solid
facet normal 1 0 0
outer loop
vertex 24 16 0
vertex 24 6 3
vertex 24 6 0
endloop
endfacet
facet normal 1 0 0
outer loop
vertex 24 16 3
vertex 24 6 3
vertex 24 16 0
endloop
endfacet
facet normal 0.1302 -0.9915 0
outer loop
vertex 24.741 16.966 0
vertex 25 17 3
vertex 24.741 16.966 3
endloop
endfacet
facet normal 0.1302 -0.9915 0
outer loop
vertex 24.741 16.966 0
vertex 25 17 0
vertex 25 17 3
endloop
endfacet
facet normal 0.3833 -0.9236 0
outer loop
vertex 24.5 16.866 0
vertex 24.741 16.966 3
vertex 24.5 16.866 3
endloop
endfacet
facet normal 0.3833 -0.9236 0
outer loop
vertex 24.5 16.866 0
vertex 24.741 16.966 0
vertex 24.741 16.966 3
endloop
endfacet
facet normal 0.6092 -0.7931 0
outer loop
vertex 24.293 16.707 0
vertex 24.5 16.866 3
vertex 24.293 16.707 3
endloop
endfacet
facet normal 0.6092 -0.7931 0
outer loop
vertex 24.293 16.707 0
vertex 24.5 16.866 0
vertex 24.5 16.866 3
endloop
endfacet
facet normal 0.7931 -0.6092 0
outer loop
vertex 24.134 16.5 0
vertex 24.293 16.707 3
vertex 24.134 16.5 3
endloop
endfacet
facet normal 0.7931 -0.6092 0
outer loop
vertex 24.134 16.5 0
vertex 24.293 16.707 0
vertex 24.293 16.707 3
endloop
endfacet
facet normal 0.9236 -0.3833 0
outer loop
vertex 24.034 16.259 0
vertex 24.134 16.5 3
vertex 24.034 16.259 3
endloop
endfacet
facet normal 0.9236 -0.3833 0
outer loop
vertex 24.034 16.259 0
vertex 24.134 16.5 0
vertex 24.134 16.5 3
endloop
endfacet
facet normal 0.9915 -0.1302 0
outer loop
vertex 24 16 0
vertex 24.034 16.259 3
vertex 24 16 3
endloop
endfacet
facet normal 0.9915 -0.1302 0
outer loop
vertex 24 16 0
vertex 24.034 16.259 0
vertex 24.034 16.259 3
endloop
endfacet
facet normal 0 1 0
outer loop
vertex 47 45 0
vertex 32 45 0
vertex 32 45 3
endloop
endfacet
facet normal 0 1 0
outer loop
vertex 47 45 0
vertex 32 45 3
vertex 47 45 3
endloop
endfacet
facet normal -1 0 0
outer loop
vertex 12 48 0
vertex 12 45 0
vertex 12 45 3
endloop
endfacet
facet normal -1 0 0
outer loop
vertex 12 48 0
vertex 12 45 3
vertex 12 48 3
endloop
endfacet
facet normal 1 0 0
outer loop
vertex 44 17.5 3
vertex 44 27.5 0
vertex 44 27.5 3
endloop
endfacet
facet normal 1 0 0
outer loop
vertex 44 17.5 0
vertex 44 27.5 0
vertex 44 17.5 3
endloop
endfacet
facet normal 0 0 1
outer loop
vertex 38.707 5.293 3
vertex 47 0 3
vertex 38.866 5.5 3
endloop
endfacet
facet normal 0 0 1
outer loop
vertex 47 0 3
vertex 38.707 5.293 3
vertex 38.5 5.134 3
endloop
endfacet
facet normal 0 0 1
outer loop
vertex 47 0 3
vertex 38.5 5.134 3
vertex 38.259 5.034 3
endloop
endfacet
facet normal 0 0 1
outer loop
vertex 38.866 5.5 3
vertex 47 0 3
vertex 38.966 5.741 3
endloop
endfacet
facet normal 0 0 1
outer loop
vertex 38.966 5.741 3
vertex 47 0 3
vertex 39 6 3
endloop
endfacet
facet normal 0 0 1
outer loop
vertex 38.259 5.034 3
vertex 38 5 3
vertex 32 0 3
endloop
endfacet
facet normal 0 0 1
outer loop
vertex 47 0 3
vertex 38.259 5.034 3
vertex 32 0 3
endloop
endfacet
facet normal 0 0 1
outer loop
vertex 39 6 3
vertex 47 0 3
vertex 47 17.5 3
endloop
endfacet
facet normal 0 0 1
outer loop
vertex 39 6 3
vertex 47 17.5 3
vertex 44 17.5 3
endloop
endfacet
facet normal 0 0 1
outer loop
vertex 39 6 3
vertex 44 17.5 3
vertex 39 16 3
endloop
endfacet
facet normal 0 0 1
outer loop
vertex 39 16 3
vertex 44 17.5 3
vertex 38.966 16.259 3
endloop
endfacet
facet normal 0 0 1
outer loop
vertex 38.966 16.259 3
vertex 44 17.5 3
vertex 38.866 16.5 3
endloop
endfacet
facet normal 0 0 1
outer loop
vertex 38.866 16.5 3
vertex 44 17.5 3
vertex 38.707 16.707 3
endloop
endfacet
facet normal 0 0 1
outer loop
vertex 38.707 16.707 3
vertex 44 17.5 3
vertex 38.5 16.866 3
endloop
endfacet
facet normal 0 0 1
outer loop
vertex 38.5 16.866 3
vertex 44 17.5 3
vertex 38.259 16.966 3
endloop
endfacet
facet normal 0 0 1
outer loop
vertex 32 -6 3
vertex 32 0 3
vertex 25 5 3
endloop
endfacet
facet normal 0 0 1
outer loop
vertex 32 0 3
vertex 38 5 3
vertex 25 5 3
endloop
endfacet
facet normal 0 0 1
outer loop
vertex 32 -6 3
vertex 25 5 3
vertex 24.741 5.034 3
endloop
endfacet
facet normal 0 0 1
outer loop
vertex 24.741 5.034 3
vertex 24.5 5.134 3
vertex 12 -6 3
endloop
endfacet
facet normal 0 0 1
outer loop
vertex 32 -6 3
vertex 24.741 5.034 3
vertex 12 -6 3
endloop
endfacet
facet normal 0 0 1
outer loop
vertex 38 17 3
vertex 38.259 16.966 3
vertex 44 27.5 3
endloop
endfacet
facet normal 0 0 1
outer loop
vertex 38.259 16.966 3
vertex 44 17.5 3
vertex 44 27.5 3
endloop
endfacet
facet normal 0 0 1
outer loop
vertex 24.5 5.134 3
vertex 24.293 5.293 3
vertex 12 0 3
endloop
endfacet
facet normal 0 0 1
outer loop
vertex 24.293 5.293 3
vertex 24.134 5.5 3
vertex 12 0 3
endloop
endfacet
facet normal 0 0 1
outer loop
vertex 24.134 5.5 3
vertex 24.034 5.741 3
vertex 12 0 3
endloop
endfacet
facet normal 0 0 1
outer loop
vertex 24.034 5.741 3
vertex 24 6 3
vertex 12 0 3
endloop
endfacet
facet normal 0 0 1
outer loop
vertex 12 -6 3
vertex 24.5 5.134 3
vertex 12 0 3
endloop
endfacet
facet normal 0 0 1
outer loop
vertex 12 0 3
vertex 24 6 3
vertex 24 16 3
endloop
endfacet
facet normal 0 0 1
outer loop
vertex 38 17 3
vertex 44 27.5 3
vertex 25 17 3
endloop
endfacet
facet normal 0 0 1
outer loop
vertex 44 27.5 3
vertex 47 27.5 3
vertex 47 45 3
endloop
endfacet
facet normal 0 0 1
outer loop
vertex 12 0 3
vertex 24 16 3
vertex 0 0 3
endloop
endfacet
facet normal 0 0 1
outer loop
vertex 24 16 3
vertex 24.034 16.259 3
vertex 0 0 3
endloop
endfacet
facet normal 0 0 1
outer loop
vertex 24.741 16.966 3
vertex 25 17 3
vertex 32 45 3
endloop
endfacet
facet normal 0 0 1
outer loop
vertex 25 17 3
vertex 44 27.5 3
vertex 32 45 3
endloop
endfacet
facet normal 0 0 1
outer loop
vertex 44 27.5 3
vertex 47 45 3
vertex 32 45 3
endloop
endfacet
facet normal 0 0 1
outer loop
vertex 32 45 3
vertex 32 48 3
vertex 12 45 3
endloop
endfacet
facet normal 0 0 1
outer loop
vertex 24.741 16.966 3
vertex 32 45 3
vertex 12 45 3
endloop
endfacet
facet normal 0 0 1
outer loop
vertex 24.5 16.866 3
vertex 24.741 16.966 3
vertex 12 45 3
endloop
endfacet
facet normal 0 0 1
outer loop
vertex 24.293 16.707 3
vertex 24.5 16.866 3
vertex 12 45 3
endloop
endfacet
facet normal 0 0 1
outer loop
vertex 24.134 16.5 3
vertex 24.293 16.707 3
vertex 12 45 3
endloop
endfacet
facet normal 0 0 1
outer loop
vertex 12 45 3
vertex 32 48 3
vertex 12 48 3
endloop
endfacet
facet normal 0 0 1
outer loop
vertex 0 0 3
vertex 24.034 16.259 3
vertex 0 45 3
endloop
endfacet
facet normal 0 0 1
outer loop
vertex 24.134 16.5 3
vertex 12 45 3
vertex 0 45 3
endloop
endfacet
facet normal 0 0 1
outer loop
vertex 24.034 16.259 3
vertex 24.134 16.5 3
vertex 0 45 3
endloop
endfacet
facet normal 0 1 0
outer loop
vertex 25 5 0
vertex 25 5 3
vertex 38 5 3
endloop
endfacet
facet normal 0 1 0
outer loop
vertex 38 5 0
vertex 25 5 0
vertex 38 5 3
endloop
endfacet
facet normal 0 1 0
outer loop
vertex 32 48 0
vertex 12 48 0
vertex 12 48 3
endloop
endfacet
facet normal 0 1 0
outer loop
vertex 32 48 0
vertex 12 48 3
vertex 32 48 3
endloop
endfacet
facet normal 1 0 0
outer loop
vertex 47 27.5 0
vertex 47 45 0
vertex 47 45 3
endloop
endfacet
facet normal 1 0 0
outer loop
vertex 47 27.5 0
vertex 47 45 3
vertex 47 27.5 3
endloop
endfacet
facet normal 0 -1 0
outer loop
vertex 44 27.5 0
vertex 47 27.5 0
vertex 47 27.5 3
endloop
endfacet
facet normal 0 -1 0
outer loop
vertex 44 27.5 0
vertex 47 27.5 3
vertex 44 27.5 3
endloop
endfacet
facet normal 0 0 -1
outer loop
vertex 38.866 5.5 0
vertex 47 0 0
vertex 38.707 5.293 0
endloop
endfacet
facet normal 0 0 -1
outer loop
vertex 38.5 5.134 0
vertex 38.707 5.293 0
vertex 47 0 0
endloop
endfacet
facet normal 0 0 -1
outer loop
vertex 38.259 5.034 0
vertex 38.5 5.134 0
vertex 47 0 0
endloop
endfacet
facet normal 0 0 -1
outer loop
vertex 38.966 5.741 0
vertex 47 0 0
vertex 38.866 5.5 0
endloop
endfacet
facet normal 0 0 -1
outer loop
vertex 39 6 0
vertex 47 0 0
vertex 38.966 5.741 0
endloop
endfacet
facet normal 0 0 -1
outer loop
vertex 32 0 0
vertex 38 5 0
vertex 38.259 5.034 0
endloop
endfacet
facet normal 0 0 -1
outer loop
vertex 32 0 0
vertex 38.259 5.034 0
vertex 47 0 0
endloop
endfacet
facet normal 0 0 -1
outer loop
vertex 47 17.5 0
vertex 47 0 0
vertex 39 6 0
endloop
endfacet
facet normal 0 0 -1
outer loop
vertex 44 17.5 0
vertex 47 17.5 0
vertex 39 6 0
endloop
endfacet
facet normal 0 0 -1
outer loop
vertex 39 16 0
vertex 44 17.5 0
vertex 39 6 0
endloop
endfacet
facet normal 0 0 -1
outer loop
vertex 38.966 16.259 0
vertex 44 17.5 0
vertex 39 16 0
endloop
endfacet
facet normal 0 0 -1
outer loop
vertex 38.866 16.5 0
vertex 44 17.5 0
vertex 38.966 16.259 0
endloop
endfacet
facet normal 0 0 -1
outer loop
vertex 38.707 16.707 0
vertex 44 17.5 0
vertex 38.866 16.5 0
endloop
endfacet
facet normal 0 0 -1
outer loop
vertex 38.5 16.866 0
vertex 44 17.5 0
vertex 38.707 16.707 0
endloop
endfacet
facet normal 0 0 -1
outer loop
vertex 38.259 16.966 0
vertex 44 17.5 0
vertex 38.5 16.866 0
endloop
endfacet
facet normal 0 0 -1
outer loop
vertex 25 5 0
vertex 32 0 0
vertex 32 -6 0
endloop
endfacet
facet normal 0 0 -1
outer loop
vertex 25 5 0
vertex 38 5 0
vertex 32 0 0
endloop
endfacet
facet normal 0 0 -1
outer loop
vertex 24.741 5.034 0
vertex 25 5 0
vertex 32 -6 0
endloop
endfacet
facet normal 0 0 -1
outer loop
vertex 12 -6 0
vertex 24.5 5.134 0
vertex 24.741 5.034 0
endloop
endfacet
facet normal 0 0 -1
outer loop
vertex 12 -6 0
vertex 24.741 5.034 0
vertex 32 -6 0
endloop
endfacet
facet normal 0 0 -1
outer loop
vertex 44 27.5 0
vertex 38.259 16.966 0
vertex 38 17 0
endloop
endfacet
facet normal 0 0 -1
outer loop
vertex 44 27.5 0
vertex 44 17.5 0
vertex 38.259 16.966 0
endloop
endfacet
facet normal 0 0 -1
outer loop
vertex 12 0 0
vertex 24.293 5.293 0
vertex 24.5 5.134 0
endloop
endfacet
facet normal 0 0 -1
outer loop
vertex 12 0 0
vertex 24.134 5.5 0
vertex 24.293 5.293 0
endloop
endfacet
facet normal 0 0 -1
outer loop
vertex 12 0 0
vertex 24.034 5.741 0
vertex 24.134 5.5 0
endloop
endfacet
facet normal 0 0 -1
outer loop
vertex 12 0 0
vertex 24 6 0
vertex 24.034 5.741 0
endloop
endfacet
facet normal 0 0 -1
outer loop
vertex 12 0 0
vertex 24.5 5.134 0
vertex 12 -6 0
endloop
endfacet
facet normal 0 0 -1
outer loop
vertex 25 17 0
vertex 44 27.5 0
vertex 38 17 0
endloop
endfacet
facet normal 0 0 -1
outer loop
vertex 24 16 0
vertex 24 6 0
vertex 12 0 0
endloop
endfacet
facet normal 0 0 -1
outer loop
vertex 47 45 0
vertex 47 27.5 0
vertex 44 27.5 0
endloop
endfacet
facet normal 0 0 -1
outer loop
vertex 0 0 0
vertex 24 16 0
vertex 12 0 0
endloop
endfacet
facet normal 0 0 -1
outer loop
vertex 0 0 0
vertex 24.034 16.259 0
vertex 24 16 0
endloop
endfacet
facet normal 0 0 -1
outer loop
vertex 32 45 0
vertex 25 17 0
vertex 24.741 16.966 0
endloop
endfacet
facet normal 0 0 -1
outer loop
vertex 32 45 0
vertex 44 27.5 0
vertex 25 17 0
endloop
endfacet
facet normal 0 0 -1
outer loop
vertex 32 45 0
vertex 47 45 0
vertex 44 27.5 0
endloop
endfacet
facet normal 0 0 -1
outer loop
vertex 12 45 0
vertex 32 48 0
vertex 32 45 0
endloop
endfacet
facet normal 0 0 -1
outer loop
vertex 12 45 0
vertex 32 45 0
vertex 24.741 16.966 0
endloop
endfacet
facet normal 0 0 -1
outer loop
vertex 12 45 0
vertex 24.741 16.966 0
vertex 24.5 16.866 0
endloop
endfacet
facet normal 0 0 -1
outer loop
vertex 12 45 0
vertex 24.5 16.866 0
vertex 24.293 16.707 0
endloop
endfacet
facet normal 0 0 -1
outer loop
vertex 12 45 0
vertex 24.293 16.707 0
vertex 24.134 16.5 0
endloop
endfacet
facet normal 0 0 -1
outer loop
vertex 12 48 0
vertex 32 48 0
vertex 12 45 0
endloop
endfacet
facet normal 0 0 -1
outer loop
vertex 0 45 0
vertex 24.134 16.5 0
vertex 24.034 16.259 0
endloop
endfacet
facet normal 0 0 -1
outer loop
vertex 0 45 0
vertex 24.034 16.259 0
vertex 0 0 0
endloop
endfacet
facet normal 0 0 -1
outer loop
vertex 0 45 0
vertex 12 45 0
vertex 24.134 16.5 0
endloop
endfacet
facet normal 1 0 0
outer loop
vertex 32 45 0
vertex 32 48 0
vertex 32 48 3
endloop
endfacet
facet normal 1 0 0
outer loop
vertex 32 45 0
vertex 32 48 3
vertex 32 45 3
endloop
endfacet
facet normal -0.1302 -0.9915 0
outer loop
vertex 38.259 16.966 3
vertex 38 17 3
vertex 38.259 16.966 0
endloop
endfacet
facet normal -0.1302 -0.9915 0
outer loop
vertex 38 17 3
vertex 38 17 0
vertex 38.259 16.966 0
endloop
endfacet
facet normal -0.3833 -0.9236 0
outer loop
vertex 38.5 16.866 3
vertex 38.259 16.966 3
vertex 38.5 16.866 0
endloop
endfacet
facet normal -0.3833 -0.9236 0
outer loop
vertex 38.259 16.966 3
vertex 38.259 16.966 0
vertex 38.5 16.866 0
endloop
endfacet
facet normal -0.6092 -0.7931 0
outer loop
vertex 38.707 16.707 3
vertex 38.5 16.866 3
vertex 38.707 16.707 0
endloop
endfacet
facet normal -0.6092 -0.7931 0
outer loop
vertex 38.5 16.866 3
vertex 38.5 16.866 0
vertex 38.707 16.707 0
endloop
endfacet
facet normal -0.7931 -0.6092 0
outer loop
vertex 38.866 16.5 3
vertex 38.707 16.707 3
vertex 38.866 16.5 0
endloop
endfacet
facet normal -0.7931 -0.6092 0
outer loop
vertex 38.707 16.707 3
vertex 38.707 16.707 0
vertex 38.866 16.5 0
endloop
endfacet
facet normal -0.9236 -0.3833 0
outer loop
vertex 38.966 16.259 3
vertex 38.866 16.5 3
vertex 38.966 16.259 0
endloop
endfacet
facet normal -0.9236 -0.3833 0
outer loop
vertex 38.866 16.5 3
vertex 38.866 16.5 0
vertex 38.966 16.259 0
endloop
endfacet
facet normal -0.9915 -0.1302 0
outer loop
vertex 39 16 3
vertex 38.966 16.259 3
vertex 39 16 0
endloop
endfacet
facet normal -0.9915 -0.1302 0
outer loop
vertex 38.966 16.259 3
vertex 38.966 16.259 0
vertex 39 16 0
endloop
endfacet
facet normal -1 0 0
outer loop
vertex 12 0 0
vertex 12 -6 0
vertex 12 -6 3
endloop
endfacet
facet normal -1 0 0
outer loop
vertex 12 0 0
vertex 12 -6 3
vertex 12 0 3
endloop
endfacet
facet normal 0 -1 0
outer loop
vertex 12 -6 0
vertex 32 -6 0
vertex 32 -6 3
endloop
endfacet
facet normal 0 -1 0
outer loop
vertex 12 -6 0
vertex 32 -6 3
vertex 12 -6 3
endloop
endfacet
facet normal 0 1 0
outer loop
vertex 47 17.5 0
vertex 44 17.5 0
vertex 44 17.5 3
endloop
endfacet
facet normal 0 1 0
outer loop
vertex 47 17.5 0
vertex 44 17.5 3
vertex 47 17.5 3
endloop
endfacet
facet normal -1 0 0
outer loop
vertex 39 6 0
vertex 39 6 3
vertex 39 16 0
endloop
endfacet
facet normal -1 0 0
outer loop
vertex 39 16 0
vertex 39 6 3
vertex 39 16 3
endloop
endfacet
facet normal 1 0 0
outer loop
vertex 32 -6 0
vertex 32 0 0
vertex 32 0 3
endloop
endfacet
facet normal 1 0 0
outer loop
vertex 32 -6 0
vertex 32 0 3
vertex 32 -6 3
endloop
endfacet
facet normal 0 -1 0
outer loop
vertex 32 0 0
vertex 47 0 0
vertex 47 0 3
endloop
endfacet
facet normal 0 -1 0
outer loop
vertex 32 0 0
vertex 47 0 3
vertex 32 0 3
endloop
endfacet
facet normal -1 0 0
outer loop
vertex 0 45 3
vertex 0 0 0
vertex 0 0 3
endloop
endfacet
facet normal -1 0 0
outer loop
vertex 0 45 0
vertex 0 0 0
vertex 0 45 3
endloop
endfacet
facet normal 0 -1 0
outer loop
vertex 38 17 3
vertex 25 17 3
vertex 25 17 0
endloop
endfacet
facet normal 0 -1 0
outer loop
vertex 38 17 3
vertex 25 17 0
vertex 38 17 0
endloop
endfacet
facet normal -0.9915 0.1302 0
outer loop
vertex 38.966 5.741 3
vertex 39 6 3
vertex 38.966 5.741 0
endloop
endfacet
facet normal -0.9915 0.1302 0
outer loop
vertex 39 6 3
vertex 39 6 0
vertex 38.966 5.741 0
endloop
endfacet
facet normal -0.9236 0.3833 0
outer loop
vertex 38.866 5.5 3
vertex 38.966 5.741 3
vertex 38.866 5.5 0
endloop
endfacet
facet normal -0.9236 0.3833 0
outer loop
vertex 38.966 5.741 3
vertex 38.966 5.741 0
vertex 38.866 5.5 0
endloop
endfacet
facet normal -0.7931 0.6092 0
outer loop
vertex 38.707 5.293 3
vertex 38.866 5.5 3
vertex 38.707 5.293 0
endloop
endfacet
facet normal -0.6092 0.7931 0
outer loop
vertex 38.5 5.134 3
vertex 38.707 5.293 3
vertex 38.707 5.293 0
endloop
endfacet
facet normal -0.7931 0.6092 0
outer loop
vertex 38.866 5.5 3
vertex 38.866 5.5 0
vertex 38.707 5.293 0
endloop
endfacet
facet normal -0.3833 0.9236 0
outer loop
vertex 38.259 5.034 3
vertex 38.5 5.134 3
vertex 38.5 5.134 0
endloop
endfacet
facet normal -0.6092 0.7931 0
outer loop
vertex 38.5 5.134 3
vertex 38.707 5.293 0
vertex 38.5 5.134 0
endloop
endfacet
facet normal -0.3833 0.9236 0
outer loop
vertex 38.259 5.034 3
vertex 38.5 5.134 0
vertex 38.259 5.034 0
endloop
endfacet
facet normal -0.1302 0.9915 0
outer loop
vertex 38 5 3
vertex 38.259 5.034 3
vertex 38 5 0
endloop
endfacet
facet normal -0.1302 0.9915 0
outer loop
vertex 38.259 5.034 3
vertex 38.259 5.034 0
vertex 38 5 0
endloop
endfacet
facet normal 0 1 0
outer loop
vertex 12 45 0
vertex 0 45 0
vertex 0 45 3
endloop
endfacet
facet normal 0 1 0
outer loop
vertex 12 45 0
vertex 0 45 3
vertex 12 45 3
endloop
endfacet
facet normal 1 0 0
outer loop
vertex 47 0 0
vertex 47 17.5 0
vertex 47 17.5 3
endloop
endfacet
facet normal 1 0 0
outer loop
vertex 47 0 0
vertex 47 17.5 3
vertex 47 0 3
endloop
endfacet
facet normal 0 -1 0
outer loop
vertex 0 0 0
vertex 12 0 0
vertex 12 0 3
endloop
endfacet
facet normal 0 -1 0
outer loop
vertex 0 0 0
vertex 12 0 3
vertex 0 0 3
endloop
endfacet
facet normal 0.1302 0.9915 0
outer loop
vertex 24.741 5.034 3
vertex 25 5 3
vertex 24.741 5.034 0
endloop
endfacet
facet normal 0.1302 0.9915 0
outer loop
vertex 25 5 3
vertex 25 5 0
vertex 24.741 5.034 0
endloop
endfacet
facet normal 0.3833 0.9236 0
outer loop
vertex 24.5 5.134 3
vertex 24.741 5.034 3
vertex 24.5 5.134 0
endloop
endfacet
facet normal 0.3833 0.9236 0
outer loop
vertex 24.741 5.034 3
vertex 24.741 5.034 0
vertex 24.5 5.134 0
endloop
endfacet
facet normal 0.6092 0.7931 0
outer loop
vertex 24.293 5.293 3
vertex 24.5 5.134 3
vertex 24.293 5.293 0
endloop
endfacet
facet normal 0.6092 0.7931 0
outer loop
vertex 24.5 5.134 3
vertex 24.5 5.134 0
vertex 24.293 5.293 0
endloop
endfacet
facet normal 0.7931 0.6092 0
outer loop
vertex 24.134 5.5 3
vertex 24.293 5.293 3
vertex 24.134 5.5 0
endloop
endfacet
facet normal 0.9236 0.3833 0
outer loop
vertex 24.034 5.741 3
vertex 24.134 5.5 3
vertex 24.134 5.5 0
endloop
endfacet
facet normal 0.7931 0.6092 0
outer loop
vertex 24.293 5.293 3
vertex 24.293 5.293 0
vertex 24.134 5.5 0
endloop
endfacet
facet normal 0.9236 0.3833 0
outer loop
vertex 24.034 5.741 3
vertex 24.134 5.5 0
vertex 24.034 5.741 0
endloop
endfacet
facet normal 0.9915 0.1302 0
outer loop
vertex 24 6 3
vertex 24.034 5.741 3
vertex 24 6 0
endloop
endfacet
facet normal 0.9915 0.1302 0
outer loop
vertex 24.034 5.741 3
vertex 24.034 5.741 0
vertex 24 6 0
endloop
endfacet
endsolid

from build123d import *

# Parameters (mm, degrees)
BOSS_EXTRUDE1_DEPTH = 3
SKETCH2_W           = 15
SKETCH2_H           = 12
CUT_EXTRUDE1_DEPTH  = 68.245817714
FILLET1_R           = 1


with BuildPart() as part:
    # Sketch1 → Boss-Extrude1 (new body)
    with BuildSketch(Plane.XY):
        Polygon((0, 0), (0, 45), (12, 45), (12, 48), (32, 48), (32, 45), (47, 45), (47, 27.5), (44, 27.5), (44, 17.5), (47, 17.5), (47, 0), (32, 0), (32, -6), (12, -6), (12, 0), align=None)
    extrude(amount=BOSS_EXTRUDE1_DEPTH)

    # Sketch2 → Cut-Extrude1 (cut, through all)
    with BuildSketch(Plane.XY.offset(3)):
        with Locations((31.5, 11)):
            Rectangle(SKETCH2_W, SKETCH2_H)
    extrude(amount=-CUT_EXTRUDE1_DEPTH, mode=Mode.SUBTRACT)

    # Fillet1
    fillet1_edges = [part.edges().sort_by_distance(p)[0] for p in [
        (24, 5, 1.5),
        (24, 17, 1.5),
        (39, 17, 1.5),
        (39, 5, 1.5),
    ]]
    fillet(fillet1_edges, radius=FILLET1_R)


solid = part.part
